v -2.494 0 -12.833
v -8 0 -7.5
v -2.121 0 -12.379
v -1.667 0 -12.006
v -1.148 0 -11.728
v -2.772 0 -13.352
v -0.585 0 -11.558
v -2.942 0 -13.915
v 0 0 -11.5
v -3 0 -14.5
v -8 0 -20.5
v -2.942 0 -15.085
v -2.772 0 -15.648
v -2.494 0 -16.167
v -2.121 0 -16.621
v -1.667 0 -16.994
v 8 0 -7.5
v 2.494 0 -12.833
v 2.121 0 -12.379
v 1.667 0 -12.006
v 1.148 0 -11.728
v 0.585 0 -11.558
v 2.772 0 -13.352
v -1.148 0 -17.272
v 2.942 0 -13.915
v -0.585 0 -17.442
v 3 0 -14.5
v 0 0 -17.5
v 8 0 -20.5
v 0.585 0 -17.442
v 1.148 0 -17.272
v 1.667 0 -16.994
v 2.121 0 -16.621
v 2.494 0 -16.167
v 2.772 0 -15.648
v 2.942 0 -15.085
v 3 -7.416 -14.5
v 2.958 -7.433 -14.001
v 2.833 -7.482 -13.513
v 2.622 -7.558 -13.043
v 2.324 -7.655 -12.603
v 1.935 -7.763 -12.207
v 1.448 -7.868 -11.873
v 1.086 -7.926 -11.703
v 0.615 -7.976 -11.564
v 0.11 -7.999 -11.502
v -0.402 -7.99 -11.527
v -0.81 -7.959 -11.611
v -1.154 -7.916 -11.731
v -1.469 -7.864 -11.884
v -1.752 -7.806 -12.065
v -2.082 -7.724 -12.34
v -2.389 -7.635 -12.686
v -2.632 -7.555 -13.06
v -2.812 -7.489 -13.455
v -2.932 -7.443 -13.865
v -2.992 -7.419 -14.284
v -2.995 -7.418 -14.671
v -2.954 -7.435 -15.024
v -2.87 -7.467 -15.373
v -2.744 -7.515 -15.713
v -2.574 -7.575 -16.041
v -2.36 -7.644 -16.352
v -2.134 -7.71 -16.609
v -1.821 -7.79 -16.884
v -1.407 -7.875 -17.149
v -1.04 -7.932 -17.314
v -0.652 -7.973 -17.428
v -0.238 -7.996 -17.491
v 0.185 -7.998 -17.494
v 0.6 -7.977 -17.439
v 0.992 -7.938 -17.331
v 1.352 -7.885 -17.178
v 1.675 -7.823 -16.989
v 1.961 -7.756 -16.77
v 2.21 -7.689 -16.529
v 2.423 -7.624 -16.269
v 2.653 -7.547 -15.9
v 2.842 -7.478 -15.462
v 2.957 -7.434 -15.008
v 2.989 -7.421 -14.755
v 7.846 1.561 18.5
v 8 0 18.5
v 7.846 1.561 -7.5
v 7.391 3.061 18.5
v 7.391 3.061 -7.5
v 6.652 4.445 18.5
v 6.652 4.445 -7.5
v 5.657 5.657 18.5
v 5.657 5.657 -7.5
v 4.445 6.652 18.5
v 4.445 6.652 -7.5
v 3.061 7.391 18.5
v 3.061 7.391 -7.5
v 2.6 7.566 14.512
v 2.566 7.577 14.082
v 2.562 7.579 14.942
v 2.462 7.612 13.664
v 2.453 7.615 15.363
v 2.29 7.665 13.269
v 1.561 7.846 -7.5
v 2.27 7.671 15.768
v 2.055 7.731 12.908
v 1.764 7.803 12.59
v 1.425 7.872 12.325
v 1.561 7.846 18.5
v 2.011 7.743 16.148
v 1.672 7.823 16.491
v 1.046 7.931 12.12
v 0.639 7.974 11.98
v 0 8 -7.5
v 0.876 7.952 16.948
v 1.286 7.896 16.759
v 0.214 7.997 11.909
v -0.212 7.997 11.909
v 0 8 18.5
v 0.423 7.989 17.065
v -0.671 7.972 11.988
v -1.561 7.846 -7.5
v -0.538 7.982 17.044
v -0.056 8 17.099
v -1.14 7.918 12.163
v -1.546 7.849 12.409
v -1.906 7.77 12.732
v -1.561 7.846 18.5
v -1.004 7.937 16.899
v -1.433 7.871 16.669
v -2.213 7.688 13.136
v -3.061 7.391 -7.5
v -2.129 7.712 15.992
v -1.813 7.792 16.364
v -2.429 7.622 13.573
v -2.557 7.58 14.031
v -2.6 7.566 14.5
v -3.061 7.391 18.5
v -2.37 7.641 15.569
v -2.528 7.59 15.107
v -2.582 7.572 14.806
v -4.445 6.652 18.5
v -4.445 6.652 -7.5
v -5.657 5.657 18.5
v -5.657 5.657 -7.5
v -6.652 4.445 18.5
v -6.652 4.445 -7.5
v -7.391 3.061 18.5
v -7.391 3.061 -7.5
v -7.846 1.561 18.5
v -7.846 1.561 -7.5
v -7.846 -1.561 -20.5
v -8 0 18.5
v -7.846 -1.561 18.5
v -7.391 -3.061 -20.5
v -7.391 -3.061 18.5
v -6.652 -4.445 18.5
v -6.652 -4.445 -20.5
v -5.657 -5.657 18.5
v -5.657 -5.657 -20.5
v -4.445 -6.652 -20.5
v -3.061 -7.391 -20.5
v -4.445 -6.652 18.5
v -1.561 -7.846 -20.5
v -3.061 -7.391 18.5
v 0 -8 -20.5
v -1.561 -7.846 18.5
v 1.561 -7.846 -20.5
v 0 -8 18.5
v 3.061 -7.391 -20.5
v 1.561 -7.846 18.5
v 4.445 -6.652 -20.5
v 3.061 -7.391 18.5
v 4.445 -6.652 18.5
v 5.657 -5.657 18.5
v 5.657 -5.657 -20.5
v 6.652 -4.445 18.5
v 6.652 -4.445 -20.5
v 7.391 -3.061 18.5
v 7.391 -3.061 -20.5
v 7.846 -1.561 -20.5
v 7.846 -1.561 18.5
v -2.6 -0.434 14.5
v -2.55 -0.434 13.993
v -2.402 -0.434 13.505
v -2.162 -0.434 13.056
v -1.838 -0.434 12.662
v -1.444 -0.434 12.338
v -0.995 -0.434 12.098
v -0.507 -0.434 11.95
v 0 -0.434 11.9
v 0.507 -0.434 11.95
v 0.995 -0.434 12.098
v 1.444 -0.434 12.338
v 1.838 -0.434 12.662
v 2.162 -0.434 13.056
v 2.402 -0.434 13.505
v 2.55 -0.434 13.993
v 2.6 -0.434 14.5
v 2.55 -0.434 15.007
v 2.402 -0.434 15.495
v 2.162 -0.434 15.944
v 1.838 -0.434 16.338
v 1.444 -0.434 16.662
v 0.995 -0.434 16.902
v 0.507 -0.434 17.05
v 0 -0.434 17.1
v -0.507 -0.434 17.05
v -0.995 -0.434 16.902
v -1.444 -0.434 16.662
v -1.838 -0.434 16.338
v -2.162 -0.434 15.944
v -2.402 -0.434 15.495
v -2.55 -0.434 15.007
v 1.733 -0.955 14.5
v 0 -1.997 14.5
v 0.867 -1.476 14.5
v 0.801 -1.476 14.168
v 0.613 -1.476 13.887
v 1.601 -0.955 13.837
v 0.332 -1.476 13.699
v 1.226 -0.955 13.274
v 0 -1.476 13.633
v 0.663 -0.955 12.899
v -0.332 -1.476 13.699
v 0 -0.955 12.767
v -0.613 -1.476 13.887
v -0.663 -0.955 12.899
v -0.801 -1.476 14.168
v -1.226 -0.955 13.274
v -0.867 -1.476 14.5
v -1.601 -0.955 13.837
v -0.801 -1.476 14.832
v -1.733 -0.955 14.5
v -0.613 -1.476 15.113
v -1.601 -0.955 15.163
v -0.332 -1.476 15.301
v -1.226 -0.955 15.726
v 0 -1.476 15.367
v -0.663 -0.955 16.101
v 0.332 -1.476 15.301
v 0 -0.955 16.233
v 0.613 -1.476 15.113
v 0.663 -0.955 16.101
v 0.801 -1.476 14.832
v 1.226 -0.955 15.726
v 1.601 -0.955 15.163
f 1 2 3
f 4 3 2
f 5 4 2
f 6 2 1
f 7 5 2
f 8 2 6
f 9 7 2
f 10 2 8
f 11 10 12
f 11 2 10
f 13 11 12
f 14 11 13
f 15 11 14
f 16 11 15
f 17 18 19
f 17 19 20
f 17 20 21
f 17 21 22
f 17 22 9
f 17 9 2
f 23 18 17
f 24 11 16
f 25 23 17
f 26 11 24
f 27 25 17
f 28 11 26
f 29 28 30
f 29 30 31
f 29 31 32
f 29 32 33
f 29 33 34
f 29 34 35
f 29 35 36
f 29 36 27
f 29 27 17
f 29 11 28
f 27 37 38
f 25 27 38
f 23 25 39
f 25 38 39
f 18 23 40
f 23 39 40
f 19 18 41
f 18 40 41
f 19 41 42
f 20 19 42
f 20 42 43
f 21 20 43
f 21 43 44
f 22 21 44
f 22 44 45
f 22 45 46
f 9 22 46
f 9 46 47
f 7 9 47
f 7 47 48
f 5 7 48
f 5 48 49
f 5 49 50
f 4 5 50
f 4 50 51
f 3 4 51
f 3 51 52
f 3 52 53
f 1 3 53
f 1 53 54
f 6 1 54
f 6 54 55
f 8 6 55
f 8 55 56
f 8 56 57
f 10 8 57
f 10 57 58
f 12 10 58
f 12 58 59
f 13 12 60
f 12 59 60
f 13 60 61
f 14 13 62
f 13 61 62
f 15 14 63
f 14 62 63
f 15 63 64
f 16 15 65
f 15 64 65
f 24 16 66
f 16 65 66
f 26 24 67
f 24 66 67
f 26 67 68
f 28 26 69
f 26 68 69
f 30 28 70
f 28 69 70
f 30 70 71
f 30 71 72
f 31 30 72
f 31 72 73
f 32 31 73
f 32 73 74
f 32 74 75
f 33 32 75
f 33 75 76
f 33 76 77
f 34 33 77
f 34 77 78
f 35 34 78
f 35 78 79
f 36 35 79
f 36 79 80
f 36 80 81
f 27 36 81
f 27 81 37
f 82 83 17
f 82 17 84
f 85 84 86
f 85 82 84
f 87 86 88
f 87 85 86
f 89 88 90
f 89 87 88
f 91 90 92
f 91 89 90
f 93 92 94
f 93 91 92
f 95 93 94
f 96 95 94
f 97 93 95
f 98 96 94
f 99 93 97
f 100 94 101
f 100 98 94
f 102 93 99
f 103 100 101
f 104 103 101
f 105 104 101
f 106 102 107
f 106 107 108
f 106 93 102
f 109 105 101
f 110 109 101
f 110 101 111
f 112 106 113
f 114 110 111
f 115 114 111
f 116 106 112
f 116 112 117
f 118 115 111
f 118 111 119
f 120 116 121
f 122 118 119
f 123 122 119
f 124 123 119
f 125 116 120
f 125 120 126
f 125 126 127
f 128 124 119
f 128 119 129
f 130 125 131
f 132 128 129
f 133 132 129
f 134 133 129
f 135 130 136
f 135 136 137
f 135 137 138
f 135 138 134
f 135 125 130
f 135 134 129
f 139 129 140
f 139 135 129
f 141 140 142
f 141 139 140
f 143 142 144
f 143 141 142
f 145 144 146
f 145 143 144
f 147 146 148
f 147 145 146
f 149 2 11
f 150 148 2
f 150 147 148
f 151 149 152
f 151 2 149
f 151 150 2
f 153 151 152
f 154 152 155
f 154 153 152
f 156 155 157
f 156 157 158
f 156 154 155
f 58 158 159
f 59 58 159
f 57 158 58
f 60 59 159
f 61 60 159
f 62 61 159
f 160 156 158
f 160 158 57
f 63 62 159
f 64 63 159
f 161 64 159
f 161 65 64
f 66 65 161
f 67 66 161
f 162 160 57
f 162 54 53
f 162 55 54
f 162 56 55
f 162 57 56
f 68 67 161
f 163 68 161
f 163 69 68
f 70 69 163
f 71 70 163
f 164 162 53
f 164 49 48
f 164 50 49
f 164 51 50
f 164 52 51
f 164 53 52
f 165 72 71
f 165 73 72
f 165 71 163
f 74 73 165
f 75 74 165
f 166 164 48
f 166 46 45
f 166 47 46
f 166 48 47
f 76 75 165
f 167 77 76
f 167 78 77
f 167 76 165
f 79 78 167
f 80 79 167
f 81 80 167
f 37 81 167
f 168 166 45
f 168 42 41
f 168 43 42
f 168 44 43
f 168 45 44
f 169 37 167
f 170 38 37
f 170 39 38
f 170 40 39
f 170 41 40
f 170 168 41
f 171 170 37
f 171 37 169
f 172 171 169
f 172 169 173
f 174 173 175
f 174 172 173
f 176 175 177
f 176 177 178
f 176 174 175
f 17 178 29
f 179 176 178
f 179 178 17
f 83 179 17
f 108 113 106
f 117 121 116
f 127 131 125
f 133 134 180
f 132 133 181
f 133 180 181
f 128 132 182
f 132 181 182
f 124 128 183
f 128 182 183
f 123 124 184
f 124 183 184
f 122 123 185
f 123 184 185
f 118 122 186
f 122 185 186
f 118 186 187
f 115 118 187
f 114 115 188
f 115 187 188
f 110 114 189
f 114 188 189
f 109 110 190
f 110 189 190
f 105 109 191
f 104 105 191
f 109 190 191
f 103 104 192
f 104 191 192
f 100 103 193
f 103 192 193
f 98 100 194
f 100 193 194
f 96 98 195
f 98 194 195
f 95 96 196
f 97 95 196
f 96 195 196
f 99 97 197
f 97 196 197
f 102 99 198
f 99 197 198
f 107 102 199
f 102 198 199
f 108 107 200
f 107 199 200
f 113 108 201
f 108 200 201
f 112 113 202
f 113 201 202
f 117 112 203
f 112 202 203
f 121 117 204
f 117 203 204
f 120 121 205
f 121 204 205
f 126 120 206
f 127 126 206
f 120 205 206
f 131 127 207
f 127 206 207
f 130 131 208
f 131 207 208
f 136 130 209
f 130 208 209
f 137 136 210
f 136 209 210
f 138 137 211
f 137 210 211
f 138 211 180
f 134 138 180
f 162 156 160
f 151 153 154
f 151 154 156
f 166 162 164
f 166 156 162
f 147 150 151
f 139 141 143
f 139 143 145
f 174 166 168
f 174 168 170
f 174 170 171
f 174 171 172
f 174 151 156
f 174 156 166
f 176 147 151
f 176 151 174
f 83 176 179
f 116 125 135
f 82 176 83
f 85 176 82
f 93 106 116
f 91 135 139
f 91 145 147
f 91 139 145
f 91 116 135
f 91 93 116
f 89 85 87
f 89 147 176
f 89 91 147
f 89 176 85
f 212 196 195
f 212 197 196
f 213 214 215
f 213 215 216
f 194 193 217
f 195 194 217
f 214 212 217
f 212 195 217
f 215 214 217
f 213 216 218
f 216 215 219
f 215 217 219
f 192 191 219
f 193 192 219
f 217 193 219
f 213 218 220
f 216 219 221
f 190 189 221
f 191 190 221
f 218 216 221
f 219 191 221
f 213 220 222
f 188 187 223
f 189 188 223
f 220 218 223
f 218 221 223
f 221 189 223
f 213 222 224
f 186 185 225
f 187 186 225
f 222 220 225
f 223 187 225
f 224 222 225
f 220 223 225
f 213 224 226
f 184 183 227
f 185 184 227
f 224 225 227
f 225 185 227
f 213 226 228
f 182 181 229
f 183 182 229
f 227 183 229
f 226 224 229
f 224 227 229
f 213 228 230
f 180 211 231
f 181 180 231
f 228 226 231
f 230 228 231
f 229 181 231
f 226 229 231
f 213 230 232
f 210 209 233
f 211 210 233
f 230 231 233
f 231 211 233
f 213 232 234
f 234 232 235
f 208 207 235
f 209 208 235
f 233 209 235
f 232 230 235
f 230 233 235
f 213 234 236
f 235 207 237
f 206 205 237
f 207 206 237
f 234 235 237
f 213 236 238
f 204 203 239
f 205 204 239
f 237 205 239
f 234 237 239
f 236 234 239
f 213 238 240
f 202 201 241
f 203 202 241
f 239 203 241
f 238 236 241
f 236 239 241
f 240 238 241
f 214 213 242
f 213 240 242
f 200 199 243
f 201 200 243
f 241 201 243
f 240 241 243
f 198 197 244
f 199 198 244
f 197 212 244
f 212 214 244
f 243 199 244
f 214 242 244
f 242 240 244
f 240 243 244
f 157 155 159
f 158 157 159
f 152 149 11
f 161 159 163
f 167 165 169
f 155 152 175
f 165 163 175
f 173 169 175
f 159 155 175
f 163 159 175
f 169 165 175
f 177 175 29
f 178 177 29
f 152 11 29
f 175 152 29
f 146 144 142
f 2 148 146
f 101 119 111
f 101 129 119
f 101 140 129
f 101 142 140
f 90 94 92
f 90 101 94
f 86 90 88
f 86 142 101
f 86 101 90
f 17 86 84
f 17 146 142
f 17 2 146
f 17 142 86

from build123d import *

# Parameters (mm, degrees)
F0_R      = 8
F1_DEPTH  = 20.5
F2_W      = 16
F2_H      = 8
F3_DEPTH  = 13
F5_D      = 6
F8_D      = 5.2
F8_DEPTH  = 8
F8_START  = 0.434288
F8_TIP    = 1.5622376095
F9_R      = 8
F10_DEPTH = 2


with BuildPart() as f1:
    # F0 (on Top) → F1 (new body, symmetric)
    with BuildSketch(Plane.XY):
        Circle(F0_R)
    extrude(amount=F1_DEPTH, both=True)

    # F2 (on face) → F3 (cut)
    with BuildSketch(Plane(origin=(0, 0, -20.5), x_dir=(1, 0, 0), z_dir=(0, 0, -1))):
        with Locations((0, -4)):
            Rectangle(F2_W, F2_H)
    extrude(amount=-F3_DEPTH, mode=Mode.SUBTRACT)

    # F5 (through all)
    with Locations(Plane(origin=(0, 0, 0), x_dir=(-1, 0, 0), z_dir=(0, 1, 0))):
        with Locations((0, -14.5)):
            Hole(F5_D / 2)

    # F8
    # its depths count from where the whole tool has entered the part; down to there all is cleared
    with Locations(Plane(origin=(0, 8, 0), x_dir=(1, 0, 0), z_dir=(0, 1, 0)).offset(-F8_START)):
        with Locations((0, -14.5)):
            Hole(F8_D / 2, depth=F8_DEPTH)
            with Locations((0, 0, -(F8_DEPTH + F8_TIP / 2))):  # 118° drill point
                Cone(0, F8_D / 2, F8_TIP, mode=Mode.SUBTRACT)

    # F9 (on face) → F10 (cut)
    with BuildSketch(Plane.XY.offset(20.5)):
        Circle(F9_R)
    extrude(amount=-F10_DEPTH, mode=Mode.SUBTRACT)


solid = f1.part
